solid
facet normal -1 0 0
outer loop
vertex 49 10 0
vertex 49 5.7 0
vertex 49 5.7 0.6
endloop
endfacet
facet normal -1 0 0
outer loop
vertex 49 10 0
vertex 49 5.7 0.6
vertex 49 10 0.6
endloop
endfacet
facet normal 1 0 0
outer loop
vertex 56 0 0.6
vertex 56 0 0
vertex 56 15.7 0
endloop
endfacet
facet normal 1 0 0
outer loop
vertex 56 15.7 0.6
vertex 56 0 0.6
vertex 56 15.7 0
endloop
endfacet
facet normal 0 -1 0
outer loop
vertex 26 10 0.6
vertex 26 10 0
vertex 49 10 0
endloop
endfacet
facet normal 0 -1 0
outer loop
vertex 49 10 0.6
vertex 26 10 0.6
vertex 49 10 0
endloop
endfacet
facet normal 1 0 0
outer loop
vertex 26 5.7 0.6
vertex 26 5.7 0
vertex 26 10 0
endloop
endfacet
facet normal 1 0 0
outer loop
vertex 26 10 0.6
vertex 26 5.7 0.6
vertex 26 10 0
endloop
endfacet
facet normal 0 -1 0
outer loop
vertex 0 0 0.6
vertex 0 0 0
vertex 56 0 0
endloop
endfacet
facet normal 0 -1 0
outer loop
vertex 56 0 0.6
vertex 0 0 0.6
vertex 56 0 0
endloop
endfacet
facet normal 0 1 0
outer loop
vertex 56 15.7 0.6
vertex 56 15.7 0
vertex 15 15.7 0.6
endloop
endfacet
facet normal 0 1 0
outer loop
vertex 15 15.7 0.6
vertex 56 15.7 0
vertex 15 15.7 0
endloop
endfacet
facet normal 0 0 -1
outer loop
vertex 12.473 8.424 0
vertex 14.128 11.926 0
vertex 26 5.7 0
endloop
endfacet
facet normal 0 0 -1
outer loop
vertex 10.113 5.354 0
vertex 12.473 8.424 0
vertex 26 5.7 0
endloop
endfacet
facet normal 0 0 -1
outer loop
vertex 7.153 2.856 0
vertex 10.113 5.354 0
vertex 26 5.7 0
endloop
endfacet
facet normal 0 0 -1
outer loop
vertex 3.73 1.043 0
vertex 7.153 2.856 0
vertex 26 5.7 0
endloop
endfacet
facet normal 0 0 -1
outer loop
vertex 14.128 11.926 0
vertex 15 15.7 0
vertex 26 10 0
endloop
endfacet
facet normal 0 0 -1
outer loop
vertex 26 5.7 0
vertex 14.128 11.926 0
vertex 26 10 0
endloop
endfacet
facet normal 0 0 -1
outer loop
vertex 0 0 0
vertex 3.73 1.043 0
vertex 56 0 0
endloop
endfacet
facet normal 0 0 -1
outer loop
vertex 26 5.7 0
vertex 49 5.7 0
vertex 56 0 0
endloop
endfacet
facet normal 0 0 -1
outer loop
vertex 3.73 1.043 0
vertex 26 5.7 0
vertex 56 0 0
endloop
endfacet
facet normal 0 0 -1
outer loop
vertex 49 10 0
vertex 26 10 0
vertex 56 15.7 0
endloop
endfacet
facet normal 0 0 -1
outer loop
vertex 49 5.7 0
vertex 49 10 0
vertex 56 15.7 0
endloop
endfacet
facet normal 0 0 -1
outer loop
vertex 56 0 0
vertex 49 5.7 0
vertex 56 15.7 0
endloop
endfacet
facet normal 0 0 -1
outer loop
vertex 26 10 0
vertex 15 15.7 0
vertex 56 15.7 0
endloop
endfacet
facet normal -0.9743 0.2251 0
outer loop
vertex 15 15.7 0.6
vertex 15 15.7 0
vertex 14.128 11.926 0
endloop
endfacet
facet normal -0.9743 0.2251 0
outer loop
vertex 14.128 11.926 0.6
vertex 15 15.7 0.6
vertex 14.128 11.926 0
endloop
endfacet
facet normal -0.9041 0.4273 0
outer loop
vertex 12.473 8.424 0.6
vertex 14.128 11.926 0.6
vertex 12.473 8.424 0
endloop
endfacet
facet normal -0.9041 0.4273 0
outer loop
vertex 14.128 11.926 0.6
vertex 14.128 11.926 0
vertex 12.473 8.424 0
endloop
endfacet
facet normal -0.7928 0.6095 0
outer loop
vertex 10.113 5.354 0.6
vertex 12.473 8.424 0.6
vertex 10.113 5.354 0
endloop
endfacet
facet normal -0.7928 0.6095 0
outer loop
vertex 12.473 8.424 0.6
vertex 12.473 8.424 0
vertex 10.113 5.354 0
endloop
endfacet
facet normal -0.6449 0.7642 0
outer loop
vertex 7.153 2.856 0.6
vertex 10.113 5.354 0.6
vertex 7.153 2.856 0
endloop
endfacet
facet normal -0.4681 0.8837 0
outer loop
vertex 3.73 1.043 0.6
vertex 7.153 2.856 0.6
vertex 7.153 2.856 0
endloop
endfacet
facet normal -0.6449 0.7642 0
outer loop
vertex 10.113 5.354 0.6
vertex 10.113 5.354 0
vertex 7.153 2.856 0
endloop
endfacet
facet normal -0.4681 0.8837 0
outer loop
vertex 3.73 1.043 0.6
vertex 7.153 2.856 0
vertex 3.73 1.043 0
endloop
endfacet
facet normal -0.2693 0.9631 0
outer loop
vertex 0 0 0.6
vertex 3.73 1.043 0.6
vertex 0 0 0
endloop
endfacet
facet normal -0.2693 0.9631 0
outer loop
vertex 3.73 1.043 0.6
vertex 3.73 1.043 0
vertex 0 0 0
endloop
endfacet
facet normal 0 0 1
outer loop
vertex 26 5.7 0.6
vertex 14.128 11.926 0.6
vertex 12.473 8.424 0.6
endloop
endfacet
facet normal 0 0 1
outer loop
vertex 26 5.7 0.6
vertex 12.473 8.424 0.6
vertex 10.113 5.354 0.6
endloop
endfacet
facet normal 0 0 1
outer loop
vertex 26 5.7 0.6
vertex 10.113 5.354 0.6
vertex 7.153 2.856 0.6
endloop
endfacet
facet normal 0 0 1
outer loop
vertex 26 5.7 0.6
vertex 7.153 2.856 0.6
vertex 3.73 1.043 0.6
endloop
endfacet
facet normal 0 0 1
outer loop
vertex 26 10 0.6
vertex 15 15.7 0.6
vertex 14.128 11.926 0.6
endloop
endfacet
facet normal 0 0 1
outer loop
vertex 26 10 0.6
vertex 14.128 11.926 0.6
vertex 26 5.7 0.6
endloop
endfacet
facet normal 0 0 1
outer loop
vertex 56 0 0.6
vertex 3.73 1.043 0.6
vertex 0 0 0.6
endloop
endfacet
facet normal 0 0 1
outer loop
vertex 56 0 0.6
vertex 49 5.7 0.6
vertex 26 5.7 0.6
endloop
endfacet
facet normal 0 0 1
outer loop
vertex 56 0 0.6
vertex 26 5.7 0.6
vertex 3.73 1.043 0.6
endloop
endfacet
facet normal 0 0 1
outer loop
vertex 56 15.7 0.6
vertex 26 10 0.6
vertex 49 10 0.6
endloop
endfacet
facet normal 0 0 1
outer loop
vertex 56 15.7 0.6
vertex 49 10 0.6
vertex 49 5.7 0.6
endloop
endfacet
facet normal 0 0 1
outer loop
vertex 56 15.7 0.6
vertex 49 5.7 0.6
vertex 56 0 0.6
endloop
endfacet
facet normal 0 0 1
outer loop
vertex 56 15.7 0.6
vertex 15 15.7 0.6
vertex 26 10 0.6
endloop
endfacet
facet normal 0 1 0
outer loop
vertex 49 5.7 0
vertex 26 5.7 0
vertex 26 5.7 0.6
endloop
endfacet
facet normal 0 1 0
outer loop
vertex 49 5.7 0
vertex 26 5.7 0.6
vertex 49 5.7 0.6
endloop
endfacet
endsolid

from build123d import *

# Parameters (mm, degrees)
SKETCH_1_W      = 23
SKETCH_1_H      = 4.3
EXTRUDE_1_DEPTH = 0.6


with BuildPart() as part:
    # Эскиз1 → Бобышка-Вытянуть1 (new body)
    with BuildSketch(Plane.XY):
        with BuildLine():
            Line((0, 0), (56, 0))
            Line((56, 0), (56, 15.7))
            Line((56, 15.7), (15, 15.7))
            ThreePointArc((15, 15.7), (10.112556238, 5.353927161), (0, 0))
        make_face()
        with Locations((37.5, 7.85)):
            Rectangle(SKETCH_1_W, SKETCH_1_H, mode=Mode.SUBTRACT)
    extrude(amount=EXTRUDE_1_DEPTH)


solid = part.part
